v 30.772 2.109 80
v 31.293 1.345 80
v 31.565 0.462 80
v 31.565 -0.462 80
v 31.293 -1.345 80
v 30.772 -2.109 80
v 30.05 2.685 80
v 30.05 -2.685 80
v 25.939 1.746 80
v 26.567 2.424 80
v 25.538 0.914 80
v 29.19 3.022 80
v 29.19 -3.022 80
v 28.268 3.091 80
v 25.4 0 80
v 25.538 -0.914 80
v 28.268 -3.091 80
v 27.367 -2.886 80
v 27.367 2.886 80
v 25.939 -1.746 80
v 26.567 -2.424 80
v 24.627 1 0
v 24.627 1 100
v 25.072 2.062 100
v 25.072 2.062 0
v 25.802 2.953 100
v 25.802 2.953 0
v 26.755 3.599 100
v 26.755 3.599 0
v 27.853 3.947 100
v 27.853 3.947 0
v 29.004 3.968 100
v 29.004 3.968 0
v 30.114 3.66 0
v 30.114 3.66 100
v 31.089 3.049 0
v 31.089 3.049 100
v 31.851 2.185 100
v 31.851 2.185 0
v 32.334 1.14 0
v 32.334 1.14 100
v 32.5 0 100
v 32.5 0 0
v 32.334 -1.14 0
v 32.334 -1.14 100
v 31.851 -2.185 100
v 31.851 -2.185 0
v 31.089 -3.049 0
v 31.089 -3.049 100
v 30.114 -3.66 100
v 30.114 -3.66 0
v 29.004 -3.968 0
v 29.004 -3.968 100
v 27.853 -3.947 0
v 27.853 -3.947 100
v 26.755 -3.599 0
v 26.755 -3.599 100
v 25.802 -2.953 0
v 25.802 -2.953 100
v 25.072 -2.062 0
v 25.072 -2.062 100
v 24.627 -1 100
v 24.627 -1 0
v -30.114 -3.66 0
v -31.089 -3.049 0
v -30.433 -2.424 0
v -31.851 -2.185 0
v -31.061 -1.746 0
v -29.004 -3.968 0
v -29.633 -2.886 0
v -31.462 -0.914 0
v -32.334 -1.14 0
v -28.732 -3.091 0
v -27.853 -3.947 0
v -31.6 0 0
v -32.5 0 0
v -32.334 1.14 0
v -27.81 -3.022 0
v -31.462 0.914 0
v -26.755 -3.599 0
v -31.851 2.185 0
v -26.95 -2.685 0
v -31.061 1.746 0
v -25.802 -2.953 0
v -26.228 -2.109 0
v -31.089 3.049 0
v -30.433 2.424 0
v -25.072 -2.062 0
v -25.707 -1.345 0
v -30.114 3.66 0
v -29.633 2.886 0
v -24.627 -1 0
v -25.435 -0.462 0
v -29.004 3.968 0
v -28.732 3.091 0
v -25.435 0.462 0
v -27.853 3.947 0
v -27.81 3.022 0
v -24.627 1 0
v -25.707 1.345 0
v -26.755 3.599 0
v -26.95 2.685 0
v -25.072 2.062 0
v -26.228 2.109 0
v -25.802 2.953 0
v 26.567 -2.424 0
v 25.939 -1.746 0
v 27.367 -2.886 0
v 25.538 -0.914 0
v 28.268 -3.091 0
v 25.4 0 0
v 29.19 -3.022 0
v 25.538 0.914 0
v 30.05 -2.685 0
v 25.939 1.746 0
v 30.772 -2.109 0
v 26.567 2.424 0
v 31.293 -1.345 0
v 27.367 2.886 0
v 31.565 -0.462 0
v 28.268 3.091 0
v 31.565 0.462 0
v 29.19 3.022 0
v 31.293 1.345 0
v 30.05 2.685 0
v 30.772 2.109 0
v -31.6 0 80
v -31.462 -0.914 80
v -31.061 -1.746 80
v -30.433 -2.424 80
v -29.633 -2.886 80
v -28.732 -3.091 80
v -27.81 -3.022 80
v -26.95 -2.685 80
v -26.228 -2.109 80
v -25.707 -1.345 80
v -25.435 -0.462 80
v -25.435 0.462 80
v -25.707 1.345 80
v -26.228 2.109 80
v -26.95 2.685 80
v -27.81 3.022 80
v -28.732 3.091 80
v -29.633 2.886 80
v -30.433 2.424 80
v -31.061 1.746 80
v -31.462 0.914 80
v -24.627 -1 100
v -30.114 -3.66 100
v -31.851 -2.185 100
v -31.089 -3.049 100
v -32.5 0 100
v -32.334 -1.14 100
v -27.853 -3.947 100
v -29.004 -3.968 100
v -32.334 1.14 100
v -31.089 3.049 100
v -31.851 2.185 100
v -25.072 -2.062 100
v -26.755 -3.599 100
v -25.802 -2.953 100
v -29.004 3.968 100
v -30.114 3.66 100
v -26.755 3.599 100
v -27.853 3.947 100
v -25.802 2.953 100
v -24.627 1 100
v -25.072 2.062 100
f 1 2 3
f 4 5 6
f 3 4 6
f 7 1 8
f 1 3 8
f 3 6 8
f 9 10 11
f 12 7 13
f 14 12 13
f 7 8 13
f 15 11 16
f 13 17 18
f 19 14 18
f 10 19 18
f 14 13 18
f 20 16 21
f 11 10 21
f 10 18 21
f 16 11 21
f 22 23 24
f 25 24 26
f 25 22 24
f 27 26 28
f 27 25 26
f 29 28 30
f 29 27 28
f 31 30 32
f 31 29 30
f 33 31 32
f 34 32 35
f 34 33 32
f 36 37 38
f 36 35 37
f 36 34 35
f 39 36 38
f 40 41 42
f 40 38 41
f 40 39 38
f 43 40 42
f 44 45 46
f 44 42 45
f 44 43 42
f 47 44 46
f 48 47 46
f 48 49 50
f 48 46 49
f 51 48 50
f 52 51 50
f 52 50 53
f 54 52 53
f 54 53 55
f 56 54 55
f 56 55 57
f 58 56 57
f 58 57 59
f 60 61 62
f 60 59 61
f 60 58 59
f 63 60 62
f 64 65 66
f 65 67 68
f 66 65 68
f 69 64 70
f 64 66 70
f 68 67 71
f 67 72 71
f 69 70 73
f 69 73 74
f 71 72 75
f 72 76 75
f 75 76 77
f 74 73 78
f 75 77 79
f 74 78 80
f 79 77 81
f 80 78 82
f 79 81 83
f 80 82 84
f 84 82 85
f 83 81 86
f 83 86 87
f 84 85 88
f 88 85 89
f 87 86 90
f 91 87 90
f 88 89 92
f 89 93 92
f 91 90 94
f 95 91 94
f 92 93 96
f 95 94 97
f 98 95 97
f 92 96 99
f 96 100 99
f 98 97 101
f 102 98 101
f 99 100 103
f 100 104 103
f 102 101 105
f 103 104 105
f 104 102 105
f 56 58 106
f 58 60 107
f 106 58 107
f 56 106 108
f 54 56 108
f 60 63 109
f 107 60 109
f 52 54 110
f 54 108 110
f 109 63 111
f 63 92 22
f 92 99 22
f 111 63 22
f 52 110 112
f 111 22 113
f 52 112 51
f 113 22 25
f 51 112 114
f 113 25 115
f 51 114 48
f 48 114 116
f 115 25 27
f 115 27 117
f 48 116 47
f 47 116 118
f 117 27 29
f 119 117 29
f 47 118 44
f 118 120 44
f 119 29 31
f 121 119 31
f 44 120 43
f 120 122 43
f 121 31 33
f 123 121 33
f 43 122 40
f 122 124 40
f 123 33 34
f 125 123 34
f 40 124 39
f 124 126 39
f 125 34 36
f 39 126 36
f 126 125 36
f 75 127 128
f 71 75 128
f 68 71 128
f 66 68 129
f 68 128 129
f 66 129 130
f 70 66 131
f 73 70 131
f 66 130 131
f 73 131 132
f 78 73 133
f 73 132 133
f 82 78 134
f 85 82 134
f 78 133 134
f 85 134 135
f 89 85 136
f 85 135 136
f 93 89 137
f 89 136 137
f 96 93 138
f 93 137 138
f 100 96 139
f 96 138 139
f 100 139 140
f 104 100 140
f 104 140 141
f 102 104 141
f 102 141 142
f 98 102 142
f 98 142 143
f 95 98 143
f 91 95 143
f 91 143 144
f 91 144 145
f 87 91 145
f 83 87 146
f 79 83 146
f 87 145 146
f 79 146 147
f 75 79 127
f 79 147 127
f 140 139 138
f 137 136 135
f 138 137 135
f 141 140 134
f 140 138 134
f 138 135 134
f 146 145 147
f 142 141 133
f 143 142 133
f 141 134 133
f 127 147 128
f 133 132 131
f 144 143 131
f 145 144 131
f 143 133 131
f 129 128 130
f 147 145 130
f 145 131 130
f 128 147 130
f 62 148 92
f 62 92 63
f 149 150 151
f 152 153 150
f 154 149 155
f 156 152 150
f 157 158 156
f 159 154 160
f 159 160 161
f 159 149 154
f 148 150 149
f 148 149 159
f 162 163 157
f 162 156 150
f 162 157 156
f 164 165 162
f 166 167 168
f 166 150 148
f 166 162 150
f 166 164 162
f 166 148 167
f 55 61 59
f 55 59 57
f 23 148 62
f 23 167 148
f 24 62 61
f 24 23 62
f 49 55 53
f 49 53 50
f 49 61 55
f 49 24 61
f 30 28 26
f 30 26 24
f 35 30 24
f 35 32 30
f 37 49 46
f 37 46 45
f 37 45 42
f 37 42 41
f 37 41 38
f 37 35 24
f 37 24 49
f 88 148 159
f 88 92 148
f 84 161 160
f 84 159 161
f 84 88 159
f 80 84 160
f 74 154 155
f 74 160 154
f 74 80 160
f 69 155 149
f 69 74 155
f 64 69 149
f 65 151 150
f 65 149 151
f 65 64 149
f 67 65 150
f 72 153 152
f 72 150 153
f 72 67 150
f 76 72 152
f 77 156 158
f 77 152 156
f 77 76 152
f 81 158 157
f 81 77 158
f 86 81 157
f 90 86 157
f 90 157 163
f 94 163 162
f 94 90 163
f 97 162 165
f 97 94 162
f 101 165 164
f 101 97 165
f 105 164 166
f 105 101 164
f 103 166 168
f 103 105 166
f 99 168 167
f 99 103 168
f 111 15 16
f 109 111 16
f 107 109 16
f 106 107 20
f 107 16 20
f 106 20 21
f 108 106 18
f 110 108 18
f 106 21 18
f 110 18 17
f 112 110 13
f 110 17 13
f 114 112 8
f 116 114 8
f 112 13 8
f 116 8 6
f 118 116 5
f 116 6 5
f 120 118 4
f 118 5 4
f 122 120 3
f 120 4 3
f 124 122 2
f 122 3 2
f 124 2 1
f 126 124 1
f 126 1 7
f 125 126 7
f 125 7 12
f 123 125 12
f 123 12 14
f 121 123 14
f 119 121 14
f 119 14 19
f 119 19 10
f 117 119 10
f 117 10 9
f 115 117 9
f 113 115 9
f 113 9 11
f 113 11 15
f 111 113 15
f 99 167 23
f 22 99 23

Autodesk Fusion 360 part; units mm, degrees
sketch "Sketch1" plane through (0, 0, 0) normal (0, 0, 1) x (1, 0, 0)
  circle A0 centre (0, 0) radius 3
  dimension "d1" = 6
extrude "Extrude1" add sketch "Sketch1" along normal blind 100
thread "Thread1" thread offset 0 thread length 10

Autodesk Fusion 360 part; units mm, degrees
sketch "Sketch1" plane through (0, 0, 0) normal (0, 0, 1) x (1, 0, 0)
  circle A0 centre (-28.5, 0) radius 4
  circle A1 centre (28.5, 0) radius 4
  line L0 (-24.627, 1) -> (24.627, 1)
  line L1 (-24.627, -1) -> (24.627, -1)
  dimension "d1" = 8
  dimension "d2" = 28.5
  dimension "d3" = 8
  dimension "d4" = 28.5
  dimension "d5" = 1
  dimension "d6" = 1
extrude "Extrude1" add sketch "Sketch1" along normal blind 80
sketch "Sketch2" plane through (0, 0, 80) normal (0, 0, 1) x (-1, 0, 0)
  arc A0 (24.627, -1) -> (24.627, 1) centre (28.5, 0) ccw
  line L0 (24.627, 1) -> (-24.627, 1)
  arc A1 (-24.627, 1) -> (-24.627, -1) centre (-28.5, 0) ccw
  line L1 (-24.627, -1) -> (24.627, -1)
  circle A2 centre (28.5, 0) radius 3.1
  circle A3 centre (-28.5, 0) radius 3.1
  dimension "d9" = 6.2
  dimension "d10" = 6.2
extrude "Extrude2" cut sketch "Sketch2" against normal blind 90 contours A2 | A3
thread "Thread1" thread offset 0 thread length 10
thread "Thread2" thread offset 0 thread length 10
